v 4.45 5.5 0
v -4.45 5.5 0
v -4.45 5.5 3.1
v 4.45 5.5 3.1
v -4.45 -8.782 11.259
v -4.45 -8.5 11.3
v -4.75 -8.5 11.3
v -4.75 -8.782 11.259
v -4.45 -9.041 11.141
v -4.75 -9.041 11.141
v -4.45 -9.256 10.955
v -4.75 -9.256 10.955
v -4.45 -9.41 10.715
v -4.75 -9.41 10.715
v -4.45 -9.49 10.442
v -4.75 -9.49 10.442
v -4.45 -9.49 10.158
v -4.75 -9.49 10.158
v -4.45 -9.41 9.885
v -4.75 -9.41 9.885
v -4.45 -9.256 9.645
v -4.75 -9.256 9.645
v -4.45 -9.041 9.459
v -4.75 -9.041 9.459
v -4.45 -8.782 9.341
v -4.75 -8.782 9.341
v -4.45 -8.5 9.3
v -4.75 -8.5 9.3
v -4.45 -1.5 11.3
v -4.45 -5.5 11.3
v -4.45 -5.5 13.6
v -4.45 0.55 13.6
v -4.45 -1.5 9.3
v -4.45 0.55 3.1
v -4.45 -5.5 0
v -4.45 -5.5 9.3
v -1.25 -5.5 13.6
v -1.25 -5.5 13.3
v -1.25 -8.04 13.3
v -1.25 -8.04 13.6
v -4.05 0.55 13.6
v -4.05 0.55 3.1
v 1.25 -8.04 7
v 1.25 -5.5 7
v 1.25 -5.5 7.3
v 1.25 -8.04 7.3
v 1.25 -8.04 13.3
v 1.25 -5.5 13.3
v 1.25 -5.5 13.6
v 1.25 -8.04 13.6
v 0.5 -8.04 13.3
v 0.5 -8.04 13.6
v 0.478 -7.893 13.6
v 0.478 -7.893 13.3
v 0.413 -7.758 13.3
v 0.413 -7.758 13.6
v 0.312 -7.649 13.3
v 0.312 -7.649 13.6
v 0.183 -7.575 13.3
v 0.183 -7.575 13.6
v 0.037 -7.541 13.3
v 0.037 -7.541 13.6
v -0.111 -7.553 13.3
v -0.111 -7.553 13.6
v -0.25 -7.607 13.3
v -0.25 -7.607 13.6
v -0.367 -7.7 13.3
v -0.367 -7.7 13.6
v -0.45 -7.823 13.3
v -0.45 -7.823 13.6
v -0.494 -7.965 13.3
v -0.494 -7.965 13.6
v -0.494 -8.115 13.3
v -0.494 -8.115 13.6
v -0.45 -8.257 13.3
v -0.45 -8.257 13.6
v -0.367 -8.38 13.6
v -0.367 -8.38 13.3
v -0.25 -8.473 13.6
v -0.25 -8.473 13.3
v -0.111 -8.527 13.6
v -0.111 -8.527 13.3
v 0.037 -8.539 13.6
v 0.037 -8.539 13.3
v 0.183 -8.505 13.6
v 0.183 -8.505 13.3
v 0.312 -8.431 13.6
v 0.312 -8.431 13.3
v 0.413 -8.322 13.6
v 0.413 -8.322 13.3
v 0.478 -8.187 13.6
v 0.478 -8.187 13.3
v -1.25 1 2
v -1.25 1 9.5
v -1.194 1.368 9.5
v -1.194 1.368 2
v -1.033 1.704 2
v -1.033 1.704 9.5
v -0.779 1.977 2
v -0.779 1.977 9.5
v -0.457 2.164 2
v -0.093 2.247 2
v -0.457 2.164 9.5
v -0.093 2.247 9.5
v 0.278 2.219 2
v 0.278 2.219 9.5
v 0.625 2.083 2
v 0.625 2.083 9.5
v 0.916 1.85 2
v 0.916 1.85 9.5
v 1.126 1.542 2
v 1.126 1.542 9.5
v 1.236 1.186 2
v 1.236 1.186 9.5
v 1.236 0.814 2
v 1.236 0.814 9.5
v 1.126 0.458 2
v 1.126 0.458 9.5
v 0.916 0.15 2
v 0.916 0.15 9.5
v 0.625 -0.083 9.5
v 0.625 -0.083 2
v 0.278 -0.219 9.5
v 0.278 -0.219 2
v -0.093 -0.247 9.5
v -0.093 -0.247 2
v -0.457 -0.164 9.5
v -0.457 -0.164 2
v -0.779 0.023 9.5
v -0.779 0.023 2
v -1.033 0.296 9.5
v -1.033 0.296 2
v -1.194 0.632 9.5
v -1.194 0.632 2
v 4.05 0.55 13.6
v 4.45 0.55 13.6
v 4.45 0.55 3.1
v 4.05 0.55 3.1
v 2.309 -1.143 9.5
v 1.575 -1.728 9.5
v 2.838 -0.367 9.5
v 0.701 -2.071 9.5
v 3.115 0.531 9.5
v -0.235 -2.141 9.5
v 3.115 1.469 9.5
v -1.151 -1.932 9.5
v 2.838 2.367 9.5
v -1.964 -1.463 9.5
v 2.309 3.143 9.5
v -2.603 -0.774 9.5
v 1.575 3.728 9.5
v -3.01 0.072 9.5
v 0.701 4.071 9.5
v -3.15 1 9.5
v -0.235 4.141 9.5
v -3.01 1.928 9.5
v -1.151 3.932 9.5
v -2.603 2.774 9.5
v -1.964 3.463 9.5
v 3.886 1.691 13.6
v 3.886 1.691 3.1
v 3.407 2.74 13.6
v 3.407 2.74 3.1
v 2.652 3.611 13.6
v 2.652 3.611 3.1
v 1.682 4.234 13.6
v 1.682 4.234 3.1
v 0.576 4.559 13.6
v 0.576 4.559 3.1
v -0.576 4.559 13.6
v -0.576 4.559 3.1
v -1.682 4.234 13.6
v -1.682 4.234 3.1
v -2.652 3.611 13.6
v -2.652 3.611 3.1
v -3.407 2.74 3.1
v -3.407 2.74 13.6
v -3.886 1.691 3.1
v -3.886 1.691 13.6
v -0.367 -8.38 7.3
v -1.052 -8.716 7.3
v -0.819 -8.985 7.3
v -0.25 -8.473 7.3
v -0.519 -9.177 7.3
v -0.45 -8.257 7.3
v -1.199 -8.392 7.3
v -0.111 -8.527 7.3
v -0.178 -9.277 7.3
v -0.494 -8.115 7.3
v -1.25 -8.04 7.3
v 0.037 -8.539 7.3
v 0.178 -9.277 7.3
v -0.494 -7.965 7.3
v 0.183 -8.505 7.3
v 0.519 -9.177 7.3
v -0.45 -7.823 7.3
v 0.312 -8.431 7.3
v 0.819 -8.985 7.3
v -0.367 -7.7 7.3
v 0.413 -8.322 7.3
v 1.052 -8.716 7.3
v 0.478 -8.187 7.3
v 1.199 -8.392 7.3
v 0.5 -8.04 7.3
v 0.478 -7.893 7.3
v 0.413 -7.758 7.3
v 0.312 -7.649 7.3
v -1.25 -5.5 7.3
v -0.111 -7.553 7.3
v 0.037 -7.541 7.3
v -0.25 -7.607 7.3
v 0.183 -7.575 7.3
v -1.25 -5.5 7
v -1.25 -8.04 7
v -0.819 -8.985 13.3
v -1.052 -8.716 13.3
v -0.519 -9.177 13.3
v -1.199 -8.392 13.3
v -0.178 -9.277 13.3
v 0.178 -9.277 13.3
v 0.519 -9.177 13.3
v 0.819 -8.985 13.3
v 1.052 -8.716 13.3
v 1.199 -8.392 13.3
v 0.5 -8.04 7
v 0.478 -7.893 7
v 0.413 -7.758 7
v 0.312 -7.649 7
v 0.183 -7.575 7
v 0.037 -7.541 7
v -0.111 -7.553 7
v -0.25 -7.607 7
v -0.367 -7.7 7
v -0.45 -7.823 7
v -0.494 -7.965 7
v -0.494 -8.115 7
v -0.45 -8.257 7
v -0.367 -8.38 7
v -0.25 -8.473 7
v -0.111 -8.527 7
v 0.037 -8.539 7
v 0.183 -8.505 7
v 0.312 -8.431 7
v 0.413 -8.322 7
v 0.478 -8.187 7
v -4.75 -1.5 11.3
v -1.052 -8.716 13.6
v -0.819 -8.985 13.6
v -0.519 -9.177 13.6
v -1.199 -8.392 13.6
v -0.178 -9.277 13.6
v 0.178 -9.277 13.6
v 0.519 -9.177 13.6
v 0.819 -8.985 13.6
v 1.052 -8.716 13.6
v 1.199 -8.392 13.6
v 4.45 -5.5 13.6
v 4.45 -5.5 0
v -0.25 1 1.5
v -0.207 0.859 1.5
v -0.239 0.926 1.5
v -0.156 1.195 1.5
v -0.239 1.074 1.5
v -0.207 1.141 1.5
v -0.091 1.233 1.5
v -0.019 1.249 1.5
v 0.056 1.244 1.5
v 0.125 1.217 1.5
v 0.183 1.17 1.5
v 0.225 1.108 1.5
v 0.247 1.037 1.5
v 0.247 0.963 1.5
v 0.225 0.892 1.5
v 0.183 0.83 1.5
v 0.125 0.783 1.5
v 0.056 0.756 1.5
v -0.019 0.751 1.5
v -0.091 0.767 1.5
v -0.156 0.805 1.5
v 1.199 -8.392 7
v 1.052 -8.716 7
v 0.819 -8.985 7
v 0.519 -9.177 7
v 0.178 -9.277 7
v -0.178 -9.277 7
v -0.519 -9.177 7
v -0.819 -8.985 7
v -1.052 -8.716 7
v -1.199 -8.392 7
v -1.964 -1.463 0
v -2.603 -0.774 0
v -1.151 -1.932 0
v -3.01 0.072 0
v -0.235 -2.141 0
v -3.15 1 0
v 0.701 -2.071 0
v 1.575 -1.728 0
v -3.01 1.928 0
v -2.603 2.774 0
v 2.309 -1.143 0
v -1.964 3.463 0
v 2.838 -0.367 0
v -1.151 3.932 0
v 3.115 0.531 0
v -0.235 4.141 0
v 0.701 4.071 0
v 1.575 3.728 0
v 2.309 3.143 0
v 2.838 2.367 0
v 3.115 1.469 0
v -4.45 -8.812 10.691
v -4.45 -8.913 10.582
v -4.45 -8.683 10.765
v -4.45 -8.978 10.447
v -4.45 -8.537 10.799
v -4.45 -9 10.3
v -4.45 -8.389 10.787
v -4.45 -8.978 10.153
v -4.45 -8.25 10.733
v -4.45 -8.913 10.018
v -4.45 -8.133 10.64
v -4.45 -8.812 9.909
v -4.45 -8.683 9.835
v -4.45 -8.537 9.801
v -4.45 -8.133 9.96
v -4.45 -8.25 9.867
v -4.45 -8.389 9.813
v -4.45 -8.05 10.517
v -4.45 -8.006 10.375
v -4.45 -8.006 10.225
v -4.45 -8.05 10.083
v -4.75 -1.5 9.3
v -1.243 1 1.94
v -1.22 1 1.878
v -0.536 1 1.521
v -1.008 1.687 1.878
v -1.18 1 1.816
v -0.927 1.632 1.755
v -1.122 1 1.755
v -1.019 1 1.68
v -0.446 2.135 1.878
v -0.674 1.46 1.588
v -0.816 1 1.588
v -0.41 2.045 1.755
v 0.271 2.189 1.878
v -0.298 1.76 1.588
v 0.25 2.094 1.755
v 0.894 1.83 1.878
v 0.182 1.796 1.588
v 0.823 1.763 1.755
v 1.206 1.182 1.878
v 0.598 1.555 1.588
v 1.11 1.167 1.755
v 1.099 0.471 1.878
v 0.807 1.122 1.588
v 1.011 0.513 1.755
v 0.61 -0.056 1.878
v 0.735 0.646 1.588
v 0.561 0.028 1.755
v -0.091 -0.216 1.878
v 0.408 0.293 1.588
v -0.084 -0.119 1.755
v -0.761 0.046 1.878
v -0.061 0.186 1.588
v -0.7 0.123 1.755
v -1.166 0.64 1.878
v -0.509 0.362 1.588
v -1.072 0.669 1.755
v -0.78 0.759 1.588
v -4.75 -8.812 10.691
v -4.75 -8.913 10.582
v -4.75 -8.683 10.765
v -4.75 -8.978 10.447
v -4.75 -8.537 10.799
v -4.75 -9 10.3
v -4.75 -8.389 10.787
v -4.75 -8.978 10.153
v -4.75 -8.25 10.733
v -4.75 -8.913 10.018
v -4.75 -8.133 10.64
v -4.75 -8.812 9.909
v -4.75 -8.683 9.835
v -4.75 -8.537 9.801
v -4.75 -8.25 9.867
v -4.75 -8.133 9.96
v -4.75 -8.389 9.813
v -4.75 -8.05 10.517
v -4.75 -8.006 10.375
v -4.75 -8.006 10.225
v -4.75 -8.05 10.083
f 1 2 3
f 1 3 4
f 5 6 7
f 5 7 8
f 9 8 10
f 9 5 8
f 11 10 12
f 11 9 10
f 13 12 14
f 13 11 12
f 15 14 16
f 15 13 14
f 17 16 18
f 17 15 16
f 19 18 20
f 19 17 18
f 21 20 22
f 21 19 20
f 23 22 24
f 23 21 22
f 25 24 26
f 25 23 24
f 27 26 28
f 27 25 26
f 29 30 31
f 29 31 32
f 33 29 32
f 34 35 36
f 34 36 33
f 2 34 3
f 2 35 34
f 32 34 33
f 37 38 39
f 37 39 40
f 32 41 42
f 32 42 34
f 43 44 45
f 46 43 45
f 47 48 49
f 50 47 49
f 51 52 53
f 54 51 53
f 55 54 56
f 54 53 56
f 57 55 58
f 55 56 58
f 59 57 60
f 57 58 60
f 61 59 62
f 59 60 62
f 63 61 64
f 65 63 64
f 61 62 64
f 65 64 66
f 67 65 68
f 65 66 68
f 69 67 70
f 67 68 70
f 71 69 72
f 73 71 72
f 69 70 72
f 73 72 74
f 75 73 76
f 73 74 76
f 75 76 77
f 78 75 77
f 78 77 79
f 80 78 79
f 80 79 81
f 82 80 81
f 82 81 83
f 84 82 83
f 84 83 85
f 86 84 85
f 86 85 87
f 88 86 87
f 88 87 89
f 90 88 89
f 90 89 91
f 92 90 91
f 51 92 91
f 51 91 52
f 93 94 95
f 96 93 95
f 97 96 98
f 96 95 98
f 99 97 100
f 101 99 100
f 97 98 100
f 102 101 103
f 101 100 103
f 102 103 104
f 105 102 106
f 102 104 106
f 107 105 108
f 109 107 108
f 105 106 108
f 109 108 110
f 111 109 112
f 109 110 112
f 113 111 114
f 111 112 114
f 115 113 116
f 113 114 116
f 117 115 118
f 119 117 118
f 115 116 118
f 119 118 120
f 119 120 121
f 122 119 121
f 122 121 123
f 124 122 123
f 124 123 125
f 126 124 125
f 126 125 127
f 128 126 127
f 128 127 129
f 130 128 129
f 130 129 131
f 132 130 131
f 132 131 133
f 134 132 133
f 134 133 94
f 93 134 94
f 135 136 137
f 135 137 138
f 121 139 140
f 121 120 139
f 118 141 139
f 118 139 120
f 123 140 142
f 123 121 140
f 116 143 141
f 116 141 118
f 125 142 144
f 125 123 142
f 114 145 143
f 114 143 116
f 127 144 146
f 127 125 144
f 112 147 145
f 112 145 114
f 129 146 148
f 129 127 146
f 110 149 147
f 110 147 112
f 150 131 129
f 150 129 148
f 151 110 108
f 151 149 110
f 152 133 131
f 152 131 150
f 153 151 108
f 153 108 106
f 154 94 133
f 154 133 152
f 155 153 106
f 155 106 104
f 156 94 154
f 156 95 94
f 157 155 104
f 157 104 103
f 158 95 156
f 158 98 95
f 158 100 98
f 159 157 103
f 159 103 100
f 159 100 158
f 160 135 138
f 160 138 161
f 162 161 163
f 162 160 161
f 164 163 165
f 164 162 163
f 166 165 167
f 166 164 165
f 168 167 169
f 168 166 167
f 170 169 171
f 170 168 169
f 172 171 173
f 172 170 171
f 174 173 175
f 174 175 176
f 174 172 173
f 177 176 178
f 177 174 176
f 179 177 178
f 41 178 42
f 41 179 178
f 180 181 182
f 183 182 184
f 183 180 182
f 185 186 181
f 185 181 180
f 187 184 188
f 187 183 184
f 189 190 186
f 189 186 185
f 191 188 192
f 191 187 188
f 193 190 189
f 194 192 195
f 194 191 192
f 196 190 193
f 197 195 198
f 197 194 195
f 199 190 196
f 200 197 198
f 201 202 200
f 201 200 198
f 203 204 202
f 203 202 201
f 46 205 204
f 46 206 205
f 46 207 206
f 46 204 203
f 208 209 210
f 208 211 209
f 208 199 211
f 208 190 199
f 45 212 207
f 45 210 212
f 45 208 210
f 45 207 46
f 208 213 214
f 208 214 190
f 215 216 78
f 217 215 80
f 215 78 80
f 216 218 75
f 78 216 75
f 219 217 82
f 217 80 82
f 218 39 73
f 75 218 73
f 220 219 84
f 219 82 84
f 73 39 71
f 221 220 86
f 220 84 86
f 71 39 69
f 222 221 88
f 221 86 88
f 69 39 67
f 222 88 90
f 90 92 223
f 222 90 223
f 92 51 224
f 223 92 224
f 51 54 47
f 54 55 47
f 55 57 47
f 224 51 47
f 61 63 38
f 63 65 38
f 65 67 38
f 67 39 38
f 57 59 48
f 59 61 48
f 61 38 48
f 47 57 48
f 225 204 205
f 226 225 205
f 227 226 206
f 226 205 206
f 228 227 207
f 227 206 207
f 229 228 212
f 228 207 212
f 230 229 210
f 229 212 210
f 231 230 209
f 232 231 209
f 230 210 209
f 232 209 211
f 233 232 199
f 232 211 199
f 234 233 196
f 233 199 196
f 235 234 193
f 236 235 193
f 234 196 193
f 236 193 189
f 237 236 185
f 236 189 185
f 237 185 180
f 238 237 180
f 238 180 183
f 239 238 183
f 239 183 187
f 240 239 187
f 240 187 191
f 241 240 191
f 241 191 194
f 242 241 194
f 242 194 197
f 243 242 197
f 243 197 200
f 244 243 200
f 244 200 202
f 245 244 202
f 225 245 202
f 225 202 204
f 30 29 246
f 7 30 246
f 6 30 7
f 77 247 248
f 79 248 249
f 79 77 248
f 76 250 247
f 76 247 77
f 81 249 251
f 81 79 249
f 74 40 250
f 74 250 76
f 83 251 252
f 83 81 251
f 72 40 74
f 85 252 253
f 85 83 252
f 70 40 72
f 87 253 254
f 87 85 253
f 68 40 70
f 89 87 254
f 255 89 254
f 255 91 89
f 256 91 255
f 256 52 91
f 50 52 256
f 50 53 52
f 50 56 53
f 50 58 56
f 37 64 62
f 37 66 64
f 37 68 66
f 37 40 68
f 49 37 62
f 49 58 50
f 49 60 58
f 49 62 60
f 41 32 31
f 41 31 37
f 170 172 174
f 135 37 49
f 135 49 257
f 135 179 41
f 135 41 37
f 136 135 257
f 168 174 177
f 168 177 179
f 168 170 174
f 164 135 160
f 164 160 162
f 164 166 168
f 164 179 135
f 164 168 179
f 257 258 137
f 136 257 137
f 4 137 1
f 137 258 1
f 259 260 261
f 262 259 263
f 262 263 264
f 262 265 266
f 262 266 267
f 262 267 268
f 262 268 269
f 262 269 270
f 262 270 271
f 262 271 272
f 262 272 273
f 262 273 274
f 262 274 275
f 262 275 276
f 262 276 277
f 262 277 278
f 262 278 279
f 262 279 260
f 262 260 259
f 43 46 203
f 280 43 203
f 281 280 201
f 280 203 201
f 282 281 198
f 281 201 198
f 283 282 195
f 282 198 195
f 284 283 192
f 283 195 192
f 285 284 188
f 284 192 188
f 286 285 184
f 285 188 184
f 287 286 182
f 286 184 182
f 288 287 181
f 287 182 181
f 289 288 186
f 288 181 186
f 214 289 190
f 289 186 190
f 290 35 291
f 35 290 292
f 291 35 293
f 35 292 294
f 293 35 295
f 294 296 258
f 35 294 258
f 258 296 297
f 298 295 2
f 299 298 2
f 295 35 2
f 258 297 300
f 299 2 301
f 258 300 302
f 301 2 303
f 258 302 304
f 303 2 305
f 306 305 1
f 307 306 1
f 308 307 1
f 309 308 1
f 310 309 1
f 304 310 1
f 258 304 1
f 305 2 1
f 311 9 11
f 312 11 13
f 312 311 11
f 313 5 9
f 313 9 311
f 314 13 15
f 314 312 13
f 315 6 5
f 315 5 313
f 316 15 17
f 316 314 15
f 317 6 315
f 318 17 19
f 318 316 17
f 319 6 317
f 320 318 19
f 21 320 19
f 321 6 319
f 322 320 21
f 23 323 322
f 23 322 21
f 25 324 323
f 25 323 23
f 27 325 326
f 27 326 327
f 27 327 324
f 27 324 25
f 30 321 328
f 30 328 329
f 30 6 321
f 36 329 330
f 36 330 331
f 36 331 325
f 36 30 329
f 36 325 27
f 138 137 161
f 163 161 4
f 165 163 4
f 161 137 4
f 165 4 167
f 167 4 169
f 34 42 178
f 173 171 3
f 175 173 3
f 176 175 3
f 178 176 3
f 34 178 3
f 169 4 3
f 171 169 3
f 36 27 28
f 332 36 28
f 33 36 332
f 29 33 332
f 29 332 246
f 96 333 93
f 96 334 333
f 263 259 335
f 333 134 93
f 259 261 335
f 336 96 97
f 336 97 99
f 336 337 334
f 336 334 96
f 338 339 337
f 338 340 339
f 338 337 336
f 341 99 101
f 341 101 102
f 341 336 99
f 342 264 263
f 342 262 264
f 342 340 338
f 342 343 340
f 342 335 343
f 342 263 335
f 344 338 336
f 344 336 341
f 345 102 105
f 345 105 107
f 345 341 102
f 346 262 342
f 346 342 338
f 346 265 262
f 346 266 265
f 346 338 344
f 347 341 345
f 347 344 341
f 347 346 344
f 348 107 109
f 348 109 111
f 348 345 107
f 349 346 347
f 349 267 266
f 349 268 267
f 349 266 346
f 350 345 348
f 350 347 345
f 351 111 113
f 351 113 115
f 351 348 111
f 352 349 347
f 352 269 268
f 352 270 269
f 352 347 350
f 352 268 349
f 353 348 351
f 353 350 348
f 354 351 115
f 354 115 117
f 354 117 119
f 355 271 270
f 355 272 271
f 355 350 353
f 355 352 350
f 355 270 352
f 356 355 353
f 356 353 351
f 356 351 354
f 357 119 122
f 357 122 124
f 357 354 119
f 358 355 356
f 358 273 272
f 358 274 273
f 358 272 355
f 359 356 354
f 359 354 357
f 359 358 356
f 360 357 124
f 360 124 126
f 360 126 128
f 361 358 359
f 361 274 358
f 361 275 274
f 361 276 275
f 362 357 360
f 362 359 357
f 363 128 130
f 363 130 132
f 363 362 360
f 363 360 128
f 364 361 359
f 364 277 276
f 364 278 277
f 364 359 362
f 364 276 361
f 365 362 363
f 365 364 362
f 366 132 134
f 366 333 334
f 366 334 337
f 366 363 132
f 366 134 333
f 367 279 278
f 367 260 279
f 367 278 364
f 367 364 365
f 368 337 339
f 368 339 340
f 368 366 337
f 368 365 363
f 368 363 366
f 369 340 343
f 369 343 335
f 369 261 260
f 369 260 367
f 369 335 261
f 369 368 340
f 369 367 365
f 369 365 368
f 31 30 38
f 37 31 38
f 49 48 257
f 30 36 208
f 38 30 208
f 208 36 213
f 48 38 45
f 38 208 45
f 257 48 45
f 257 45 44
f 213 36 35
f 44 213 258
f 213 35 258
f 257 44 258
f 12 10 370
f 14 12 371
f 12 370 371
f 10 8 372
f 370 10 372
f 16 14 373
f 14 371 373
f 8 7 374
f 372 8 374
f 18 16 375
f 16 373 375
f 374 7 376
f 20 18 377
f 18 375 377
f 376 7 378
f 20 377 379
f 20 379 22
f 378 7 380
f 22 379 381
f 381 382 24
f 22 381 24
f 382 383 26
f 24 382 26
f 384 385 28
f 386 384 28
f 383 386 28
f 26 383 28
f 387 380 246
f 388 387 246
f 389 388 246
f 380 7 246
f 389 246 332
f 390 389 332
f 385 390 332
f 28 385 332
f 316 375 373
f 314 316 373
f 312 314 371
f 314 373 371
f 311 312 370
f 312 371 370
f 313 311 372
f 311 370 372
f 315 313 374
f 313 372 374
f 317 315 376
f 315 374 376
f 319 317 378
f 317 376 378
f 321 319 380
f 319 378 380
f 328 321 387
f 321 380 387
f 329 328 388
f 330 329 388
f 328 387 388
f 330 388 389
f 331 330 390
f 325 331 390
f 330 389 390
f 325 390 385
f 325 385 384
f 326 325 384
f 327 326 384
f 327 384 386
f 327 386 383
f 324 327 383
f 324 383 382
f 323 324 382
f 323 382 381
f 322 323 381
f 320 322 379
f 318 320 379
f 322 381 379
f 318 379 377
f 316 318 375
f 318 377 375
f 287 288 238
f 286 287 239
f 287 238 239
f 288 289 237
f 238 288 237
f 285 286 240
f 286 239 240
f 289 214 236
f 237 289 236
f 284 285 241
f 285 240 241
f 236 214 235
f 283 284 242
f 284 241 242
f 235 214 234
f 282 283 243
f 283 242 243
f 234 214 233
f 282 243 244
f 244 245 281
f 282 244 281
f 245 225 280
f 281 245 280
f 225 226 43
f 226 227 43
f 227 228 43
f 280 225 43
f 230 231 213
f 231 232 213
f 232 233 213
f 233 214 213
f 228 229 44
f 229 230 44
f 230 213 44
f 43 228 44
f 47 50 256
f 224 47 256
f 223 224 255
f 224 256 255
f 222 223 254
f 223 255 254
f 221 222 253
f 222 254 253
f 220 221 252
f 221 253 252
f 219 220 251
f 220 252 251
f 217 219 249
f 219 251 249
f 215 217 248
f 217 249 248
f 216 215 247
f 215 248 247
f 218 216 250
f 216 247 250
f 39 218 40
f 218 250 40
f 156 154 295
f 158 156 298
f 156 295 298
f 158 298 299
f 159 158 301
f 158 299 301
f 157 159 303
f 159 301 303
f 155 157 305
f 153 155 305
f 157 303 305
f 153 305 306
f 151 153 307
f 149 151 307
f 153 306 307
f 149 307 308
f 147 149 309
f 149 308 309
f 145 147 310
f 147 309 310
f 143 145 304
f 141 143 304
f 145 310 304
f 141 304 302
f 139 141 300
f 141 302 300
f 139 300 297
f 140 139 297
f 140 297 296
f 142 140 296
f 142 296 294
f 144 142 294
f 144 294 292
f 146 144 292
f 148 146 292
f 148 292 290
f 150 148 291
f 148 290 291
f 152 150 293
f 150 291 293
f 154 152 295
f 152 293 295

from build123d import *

# Parameters (mm, degrees)
ESBO_O1_W                = 8.9
ESBO_O1_H                = 11
RESSALTO_EXTRUS_O1_DEPTH = 13.6
CORTE_EXTRUS_O1_DEPTH    = 10.5
ESBO_O3_R                = 3.15
CORTE_EXTRUS_O2_DEPTH    = 9.5
ESBO_O4_R                = 1.25
RESSALTO_EXTRUS_O2_DEPTH = 8
FILETE1_SIZE             = 0.5
FILETE1_SIZE_2           = 1
ESBO_O5_W                = 2.5
ESBO_O5_H                = 0.3
RESSALTO_EXTRUS_O3_DEPTH = 3.8
CORTE_EXTRUS_O3_DEPTH    = 10
ESBO_O8_R                = 0.5
CORTE_EXTRUS_O4_DEPTH    = 10
RESSALTO_EXTRUS_O4_DEPTH = 0.3
ESBO_O10_R               = 0.5
CORTE_EXTRUS_O5_DEPTH    = 0.3


with BuildPart() as part:
    # Esboço1 → Ressalto-extrusão1 (new body)
    with BuildSketch(Plane.XY):
        Rectangle(ESBO_O1_W, ESBO_O1_H)
    extrude(amount=RESSALTO_EXTRUS_O1_DEPTH)

    # Esboço2 → Corte-extrusão1 (cut)
    with BuildSketch(Plane.XY.offset(13.6)):
        with BuildLine():
            Line((-4.45, 0.55), (-4.45, 5.5))
            Line((-4.45, 5.5), (4.45, 5.5))
            Line((4.45, 5.5), (4.45, 0.55))
            Line((4.45, 0.55), (4.05, 0.55))
            ThreePointArc((4.05, 0.55), (0, 4.6), (-4.05, 0.55))
            Line((-4.05, 0.55), (-4.45, 0.55))
        make_face()
    extrude(amount=-CORTE_EXTRUS_O1_DEPTH, mode=Mode.SUBTRACT)

    # Esboço3 → Corte-extrusão2 (cut)
    with BuildSketch(Plane(origin=(0, 0, 0), x_dir=(-1, 0, 0), z_dir=(0, 0, -1))):
        with Locations((0, 1)):
            Circle(ESBO_O3_R)
    extrude(amount=-CORTE_EXTRUS_O2_DEPTH, mode=Mode.SUBTRACT)

    # Esboço4 → Ressalto-extrusão2 (add)
    with BuildSketch(Plane(origin=(0, 0, 9.5), x_dir=(-1, 0, 0), z_dir=(0, 0, -1))):
        with Locations((0, 1)):
            Circle(ESBO_O4_R)
    extrude(amount=RESSALTO_EXTRUS_O2_DEPTH)

    # Filete1
    # an asymmetric fillet: 1, 0.5 mm, written as the material it takes off along each edge
    with BuildSketch(Plane(origin=(0, 1, 1.5), x_dir=(-1, 0, 0), z_dir=(0, -1, 0))) as filete1_piece_1:
        with BuildLine():
            Bezier((1.25, -FILETE1_SIZE), (1.25, 0), (1.25 - FILETE1_SIZE_2, 0), weights=[1, 0.707106781, 1])
            Line((1.25 - FILETE1_SIZE_2, 0), (1.25, 0))
            Line((1.25, 0), (1.25, -FILETE1_SIZE))
        make_face()
    revolve(axis=Axis((0, 1, 1.5), (0, 0, -1)), mode=Mode.SUBTRACT)

    # Esboço5 → Ressalto-extrusão3 (add)
    with BuildSketch(Plane.XZ.offset(5.5)):
        with Locations((0, 13.45)):
            Rectangle(ESBO_O5_W, ESBO_O5_H)
        with Locations((0, 7.15)):
            Rectangle(ESBO_O5_W, ESBO_O5_H)
    extrude(amount=RESSALTO_EXTRUS_O3_DEPTH)

    # Esboço7 → Corte-extrusão3 (cut)
    with BuildSketch(Plane.XY.offset(13.6)):
        with BuildLine():
            Line((-1.25, -8.04), (-1.25, -9.3))
            Line((-1.25, -9.3), (1.25, -9.3))
            Line((1.25, -9.3), (1.25, -8.04))
            ThreePointArc((1.25, -8.04), (0, -9.29), (-1.25, -8.04))
        make_face()
    extrude(amount=-CORTE_EXTRUS_O3_DEPTH, mode=Mode.SUBTRACT)

    # Esboço8 → Corte-extrusão4 (cut)
    with BuildSketch(Plane.XY.offset(13.6)):
        with Locations((0, -8.04)):
            Circle(ESBO_O8_R)
    extrude(amount=-CORTE_EXTRUS_O4_DEPTH, mode=Mode.SUBTRACT)

    # Esboço9 → Ressalto-extrusão4 (add)
    with BuildSketch(Plane.ZY.offset(4.45)):
        with BuildLine():
            Line((9.3, -1.5), (11.3, -1.5))
            Line((11.3, -1.5), (11.3, -8.5))
            ThreePointArc((11.3, -8.5), (10.3, -9.5), (9.3, -8.5))
            Line((9.3, -8.5), (9.3, -1.5))
        make_face()
    extrude(amount=RESSALTO_EXTRUS_O4_DEPTH)

    # Esboço10 → Corte-extrusão5 (cut)
    with BuildSketch(Plane.ZY.offset(4.75)):
        with Locations(Location((10.3, -8.5, 0), (0, 0, 270))):
            Circle(ESBO_O10_R)
    extrude(amount=-CORTE_EXTRUS_O5_DEPTH, mode=Mode.SUBTRACT)


solid = part.part
